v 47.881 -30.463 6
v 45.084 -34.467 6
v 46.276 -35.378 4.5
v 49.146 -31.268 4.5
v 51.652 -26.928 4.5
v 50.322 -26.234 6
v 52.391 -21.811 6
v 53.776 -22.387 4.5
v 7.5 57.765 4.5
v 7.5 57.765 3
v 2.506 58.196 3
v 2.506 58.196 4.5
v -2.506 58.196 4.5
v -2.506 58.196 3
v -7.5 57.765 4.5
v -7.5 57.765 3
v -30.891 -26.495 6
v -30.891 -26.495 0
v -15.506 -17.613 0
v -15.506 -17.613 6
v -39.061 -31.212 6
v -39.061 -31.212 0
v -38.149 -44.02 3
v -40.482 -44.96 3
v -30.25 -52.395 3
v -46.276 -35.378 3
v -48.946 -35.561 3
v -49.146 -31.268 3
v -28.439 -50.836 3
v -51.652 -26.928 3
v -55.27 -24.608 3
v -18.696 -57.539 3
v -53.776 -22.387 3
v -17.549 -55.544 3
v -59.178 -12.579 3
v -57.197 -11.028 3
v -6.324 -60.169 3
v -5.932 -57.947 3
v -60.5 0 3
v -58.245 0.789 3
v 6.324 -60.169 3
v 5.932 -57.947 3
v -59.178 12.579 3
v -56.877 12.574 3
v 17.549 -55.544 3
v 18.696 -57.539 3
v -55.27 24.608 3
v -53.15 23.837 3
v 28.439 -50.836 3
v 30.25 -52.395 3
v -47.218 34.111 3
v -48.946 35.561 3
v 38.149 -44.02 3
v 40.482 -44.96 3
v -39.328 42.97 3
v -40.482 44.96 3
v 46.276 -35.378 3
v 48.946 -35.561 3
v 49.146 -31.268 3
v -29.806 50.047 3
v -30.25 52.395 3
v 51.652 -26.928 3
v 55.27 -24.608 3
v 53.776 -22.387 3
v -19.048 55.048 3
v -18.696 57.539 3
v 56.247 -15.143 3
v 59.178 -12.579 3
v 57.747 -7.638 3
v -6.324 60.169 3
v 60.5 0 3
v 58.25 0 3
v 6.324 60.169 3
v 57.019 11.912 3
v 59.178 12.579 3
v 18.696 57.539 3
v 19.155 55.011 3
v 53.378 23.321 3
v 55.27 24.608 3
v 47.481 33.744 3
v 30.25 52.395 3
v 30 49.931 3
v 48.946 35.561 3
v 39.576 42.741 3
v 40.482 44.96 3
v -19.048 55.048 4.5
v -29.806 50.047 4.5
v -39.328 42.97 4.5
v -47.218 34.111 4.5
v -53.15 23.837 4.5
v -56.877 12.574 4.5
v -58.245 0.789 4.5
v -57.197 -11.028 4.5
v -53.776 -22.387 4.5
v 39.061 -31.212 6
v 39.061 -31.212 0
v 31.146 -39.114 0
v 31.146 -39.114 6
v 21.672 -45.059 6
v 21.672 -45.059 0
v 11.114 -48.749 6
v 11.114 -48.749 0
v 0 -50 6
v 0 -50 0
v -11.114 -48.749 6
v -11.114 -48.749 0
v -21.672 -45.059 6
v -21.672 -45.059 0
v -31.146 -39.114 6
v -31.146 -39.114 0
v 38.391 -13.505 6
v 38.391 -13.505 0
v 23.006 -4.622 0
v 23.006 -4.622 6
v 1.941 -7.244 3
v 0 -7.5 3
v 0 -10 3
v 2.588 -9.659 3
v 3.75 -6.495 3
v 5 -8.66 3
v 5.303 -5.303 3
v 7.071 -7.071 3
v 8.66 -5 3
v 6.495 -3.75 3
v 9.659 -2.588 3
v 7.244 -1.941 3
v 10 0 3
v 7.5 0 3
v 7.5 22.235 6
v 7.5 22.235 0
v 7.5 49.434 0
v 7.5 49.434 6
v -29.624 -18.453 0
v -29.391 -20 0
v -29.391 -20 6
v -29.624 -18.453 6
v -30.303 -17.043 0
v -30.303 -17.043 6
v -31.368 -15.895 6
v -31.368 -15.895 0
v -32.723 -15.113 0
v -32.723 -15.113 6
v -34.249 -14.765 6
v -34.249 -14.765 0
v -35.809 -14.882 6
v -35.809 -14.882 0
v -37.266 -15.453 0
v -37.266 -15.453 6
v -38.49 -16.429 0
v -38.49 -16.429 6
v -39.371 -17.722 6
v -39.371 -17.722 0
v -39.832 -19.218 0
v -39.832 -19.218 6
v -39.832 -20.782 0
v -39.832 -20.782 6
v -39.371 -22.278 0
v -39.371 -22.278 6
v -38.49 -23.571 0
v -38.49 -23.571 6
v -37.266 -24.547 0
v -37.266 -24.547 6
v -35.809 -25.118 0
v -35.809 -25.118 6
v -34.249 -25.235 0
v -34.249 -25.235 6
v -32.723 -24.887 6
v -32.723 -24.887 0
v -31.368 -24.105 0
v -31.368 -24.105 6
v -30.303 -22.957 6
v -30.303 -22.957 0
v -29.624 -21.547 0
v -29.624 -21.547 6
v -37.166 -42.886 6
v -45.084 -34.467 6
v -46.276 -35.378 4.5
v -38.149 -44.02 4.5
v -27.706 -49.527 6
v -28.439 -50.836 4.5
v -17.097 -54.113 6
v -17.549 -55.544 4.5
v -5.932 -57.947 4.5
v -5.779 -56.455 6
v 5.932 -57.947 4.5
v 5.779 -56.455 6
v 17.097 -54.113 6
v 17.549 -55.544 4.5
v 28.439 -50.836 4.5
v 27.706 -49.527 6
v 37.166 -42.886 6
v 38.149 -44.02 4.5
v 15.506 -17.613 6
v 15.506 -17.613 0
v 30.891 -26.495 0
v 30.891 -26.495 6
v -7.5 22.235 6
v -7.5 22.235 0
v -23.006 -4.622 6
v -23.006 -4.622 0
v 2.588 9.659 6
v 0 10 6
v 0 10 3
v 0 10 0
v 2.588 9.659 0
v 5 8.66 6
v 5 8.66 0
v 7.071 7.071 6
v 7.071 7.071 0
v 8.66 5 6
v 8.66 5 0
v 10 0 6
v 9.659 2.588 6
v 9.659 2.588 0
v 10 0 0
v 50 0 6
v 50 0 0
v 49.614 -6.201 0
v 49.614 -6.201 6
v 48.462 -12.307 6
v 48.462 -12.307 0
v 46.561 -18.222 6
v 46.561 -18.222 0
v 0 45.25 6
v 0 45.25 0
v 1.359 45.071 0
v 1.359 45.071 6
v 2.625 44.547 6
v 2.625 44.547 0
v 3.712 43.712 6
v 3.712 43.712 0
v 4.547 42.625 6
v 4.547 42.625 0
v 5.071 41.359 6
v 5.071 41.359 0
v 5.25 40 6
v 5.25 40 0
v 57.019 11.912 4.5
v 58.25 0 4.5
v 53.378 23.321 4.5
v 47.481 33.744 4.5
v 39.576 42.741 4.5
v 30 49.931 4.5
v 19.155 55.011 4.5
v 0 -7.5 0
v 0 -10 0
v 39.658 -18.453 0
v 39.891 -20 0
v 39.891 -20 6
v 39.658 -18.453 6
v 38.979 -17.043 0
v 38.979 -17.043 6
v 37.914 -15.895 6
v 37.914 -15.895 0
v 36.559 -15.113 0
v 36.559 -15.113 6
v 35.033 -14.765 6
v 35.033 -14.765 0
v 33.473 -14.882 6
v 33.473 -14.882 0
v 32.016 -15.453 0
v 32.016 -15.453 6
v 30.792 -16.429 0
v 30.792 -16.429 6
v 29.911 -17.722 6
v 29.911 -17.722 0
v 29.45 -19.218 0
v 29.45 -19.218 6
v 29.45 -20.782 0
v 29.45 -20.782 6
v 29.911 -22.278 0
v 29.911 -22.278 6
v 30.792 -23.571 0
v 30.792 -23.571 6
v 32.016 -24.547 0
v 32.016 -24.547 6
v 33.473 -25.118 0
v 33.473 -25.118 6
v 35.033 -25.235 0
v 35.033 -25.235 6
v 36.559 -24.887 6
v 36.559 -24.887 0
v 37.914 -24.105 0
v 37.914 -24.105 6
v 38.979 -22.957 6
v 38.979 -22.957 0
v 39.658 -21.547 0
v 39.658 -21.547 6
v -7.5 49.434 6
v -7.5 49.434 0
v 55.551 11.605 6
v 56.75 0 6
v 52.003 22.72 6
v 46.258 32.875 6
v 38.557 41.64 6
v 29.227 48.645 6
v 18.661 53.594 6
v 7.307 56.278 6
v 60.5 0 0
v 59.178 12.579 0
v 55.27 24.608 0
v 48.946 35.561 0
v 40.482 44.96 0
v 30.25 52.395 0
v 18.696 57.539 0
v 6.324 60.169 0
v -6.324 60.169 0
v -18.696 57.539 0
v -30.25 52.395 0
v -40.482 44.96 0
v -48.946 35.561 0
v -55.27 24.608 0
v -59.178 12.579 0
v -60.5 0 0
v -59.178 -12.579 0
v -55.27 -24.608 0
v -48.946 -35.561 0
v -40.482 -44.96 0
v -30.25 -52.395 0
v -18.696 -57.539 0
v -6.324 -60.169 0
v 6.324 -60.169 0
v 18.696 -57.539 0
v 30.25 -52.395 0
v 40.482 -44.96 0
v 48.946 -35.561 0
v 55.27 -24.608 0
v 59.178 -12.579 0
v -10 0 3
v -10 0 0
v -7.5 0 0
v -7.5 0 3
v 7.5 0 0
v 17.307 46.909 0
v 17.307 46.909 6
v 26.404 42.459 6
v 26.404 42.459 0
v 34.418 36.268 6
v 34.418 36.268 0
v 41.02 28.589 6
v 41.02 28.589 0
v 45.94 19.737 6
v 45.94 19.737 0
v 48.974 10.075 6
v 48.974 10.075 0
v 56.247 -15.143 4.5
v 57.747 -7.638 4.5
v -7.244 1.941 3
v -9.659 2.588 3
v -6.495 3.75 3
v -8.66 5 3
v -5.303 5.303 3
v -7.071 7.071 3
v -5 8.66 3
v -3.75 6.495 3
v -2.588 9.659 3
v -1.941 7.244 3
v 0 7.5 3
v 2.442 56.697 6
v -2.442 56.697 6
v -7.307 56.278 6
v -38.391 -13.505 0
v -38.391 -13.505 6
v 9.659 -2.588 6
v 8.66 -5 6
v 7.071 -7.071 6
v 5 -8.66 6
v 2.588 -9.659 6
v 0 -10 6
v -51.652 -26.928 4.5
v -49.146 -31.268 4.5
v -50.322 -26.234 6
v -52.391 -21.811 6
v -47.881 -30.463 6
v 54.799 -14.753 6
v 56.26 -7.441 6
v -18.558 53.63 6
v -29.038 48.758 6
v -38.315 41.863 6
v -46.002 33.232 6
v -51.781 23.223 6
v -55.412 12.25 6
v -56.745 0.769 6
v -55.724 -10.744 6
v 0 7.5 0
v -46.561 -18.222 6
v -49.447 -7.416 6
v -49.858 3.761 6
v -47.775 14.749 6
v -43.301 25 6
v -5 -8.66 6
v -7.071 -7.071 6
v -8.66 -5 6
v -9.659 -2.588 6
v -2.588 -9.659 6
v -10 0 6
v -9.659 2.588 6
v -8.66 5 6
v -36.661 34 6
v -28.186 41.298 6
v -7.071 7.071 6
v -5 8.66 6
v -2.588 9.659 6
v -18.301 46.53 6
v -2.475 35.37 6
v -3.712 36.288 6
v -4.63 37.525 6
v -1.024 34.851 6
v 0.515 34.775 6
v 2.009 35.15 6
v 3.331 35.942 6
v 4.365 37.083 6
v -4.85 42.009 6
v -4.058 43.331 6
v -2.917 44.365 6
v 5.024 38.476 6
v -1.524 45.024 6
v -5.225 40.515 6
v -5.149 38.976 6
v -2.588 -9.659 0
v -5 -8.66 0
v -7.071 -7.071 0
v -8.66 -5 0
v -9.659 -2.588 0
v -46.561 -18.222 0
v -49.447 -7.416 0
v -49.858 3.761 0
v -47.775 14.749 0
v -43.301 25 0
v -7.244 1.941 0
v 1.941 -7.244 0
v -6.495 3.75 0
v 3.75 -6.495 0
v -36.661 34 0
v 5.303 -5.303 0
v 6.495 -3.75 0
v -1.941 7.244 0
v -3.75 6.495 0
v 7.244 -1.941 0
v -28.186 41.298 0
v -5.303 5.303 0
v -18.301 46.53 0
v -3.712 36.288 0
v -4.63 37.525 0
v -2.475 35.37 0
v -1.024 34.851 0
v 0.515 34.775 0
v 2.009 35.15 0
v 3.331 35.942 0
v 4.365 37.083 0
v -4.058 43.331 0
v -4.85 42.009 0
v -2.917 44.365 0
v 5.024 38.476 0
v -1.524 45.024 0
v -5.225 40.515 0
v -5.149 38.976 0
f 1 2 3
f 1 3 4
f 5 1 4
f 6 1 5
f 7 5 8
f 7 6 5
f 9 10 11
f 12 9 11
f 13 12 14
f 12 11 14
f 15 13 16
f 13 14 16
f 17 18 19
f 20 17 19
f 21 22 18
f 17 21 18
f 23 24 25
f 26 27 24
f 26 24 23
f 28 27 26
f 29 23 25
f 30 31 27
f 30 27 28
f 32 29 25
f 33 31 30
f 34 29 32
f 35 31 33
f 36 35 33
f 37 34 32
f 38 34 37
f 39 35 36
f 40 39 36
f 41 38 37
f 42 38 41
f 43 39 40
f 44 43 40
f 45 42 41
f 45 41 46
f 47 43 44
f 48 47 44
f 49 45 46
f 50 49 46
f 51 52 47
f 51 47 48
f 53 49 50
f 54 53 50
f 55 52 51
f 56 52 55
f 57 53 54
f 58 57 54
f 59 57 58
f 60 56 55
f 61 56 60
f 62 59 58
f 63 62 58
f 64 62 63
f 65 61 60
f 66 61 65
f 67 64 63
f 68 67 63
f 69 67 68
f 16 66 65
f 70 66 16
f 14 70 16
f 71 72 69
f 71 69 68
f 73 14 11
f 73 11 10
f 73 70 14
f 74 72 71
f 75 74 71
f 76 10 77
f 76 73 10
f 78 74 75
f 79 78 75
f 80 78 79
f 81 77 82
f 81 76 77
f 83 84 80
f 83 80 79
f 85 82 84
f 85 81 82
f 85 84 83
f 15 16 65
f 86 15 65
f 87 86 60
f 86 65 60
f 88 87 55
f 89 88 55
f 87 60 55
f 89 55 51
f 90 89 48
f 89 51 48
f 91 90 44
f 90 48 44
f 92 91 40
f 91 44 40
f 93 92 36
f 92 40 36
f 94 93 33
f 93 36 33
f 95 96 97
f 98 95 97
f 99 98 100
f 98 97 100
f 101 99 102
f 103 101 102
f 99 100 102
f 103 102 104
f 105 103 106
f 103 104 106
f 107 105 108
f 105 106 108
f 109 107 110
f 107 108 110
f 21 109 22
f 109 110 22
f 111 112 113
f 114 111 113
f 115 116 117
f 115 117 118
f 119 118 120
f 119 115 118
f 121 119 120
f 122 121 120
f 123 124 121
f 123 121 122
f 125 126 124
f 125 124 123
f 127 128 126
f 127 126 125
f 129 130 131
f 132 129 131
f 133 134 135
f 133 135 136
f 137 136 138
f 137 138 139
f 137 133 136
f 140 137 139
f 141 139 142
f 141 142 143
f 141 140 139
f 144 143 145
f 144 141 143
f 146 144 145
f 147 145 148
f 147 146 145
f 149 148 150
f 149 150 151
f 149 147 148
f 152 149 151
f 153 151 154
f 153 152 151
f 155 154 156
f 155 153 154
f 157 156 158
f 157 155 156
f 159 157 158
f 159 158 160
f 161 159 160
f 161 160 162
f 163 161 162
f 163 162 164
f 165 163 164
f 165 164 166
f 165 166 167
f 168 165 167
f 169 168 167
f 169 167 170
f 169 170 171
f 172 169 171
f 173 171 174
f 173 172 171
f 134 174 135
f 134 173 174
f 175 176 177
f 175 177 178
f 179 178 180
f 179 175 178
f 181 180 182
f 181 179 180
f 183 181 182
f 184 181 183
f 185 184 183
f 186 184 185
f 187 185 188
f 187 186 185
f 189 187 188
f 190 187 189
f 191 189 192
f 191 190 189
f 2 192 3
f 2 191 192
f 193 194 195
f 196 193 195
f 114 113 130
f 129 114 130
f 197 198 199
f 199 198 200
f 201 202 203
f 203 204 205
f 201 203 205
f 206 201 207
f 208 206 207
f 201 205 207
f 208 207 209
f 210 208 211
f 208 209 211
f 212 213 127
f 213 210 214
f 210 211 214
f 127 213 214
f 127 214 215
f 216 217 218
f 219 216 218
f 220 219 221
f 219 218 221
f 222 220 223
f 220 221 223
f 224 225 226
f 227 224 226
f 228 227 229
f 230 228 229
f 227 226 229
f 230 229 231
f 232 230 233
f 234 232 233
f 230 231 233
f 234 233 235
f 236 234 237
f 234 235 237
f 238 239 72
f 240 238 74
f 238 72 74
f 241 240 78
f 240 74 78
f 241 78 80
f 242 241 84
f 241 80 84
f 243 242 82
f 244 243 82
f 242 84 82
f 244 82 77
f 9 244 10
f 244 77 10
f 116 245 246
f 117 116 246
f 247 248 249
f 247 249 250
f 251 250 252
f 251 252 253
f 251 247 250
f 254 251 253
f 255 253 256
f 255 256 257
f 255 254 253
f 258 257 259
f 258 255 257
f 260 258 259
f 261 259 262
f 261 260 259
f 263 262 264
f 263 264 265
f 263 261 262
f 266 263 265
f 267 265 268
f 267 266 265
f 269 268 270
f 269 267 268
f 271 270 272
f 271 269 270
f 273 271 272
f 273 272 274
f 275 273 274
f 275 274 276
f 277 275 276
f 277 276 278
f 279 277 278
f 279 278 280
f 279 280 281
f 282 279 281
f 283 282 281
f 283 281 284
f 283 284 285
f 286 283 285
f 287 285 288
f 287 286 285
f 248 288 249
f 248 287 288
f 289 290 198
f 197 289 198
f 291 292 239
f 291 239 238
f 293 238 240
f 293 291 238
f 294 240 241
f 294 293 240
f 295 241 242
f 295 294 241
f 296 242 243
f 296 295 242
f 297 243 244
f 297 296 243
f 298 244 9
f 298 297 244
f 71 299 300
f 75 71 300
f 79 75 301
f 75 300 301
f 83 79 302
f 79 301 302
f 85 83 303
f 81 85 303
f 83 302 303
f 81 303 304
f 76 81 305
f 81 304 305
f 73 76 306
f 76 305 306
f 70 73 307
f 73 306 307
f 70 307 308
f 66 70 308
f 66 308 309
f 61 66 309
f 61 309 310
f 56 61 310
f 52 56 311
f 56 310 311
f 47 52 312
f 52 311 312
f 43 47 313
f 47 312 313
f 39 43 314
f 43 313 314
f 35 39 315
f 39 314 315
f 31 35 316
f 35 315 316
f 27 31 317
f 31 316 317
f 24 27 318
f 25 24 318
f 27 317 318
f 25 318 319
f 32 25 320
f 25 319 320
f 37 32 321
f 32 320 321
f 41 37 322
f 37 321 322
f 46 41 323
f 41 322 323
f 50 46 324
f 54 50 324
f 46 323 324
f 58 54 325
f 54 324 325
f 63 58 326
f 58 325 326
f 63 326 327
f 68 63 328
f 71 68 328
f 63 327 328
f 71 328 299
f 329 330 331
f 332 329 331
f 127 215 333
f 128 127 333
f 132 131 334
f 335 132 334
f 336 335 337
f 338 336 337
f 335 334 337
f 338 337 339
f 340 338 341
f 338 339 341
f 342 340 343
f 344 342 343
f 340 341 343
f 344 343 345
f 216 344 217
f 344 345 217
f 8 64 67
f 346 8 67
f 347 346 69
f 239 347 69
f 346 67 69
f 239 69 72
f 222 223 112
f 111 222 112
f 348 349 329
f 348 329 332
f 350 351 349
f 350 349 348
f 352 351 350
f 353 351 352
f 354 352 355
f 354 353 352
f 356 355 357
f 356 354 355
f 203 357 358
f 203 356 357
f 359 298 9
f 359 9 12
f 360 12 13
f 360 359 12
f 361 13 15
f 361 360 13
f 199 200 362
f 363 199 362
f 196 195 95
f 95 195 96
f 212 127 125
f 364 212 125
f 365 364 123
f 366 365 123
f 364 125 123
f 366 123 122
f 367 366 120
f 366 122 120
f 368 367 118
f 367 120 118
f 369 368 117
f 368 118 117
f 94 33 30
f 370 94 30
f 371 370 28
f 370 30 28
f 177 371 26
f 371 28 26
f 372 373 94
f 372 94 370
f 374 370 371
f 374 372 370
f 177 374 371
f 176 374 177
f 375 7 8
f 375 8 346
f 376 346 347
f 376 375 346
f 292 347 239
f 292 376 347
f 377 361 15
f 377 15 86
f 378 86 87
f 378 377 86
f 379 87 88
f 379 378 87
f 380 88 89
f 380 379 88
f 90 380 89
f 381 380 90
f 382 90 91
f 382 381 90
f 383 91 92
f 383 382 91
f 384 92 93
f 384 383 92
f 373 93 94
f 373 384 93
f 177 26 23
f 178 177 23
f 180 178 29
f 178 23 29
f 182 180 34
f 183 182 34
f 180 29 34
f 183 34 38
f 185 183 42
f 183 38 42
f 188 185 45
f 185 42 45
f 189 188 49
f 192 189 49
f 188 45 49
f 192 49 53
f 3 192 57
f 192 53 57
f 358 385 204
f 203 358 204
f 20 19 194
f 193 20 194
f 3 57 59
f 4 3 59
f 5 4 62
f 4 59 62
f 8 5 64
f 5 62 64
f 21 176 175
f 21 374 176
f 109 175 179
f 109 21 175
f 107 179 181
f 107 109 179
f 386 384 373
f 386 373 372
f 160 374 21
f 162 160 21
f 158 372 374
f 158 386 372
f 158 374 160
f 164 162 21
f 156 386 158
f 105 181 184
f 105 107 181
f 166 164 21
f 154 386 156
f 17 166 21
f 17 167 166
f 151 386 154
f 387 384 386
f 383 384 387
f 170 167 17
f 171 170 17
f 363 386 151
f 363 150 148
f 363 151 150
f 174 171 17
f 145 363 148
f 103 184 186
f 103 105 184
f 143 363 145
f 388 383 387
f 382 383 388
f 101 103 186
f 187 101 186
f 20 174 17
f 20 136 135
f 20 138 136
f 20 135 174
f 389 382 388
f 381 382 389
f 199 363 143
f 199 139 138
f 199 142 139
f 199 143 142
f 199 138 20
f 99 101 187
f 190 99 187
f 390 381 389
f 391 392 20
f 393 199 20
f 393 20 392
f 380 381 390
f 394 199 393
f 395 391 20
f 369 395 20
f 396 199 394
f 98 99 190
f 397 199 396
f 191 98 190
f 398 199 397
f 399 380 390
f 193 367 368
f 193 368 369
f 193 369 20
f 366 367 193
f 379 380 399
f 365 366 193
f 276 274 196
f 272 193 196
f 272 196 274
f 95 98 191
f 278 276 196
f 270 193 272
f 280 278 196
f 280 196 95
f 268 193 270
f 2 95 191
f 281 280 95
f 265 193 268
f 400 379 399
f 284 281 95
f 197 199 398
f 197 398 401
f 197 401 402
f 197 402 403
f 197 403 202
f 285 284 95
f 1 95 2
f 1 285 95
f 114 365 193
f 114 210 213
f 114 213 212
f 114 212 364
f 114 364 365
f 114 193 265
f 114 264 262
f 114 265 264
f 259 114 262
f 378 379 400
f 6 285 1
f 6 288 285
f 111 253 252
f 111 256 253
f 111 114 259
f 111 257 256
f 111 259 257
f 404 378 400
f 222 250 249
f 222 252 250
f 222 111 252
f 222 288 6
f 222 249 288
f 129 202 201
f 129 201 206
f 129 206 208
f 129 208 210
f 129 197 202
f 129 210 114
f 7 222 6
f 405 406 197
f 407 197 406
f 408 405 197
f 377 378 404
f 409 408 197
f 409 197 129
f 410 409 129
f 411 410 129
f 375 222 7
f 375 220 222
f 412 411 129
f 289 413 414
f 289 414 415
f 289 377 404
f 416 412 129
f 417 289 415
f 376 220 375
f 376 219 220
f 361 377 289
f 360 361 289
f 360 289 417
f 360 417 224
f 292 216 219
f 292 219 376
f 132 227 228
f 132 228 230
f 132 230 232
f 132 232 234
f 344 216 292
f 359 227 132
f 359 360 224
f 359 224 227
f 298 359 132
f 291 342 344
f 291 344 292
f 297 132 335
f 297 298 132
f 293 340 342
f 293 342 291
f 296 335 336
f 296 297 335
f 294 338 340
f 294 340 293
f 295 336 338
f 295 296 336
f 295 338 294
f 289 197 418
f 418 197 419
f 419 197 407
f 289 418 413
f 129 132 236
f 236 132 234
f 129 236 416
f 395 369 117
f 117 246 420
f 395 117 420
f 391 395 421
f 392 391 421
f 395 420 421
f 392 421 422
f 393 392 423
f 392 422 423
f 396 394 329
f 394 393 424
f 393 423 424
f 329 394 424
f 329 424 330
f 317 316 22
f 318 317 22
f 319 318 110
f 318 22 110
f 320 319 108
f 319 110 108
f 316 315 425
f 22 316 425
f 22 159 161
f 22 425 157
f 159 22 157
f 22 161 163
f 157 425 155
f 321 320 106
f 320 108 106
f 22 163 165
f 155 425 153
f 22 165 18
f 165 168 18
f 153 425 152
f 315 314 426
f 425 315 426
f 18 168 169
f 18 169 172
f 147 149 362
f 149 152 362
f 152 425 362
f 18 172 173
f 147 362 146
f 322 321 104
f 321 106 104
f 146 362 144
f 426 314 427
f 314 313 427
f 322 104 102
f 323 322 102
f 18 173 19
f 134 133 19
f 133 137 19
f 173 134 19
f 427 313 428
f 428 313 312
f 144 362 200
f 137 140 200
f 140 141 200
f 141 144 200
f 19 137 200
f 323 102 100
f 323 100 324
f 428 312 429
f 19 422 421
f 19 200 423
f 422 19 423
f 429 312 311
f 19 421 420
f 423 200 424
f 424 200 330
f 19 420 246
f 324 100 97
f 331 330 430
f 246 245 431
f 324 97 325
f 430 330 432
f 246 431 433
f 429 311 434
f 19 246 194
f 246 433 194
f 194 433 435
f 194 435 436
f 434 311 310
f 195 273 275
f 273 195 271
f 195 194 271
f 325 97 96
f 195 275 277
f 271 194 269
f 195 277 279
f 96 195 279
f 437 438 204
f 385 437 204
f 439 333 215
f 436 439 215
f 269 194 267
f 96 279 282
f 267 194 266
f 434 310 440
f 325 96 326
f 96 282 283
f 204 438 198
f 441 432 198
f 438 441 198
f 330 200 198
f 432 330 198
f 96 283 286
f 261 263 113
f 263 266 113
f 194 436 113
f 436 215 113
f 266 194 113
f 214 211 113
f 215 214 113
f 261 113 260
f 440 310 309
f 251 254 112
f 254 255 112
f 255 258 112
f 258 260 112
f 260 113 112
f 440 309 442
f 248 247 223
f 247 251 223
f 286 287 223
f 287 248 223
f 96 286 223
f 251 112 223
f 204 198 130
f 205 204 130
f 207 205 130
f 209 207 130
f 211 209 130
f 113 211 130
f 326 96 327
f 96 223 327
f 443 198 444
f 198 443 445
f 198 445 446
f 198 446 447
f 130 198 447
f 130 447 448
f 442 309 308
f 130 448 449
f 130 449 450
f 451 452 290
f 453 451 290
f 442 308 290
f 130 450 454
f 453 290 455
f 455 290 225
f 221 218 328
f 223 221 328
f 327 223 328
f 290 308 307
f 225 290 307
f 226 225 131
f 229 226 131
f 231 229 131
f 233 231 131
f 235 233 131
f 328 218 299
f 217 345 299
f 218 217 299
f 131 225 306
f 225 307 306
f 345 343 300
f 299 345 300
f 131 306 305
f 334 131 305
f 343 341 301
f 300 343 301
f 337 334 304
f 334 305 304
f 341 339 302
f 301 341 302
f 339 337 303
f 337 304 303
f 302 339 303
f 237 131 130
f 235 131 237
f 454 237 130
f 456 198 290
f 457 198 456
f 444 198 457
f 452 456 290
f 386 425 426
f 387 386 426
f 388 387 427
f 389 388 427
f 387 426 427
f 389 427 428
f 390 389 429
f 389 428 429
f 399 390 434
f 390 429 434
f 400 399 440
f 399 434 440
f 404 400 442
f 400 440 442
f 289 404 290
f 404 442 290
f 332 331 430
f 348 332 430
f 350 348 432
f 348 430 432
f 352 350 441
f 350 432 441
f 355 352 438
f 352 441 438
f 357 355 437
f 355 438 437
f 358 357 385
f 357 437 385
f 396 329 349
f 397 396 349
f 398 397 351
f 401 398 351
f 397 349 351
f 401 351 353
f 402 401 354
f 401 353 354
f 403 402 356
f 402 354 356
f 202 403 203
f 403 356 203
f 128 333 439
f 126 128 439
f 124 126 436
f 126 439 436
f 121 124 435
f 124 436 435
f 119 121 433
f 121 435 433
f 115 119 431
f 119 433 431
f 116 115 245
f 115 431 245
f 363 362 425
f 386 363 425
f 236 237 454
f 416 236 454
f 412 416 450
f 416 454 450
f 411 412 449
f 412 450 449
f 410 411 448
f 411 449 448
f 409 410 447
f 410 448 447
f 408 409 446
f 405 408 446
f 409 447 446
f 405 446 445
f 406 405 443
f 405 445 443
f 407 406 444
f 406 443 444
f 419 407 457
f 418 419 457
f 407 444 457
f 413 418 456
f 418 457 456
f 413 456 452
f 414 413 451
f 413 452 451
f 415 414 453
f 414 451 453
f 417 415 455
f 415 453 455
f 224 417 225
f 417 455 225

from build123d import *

# Parameters (mm, degrees)
F0_R     = 5.25
F1_DEPTH = 6
F0_R_2   = 60.5
F2_DEPTH = 3
F3_SIZE  = 1.5


with BuildPart() as f1:
    # F0 (on Top) → F1 (new body)
    with BuildSketch(Plane.XY):
        with BuildLine():
            ThreePointArc((7.5, 49.4342998332), (37.9143772203, 32.596012026), (50, 0))
            ThreePointArc((50, 0), (49.1328198544, -9.2717858665), (46.5613594739, -18.2219593882))
            Line((46.5613594739, -18.2219593882), (53.7760869447, -22.3873842357))
            ThreePointArc((53.7760869447, -22.3873842357), (57.1205723209, -11.4150215828), (58.25, 0))
            ThreePointArc((58.25, 0), (43.7603559172, 38.4459848359), (7.5, 57.7651495281))
            Line((7.5, 57.7651495281), (7.5, 49.4342998332))
        make_face()
        with BuildLine():
            ThreePointArc((0, 50), (3.7606520937, 49.8583743801), (7.5, 49.4342998332))
            Line((7.5, 49.4342998332), (7.5, 57.7651495281))
            Line((7.5, 57.7651495281), (-7.5, 57.7651495281))
            Line((-7.5, 57.7651495281), (-7.5, 49.4342998332))
            ThreePointArc((-7.5, 49.4342998332), (-3.7606520937, 49.8583743801), (0, 50))
        make_face()
        with BuildLine():
            ThreePointArc((-46.5613594739, -18.2219593882), (-43.3012701892, 25), (-7.5, 49.4342998332))
            Line((-7.5, 49.4342998332), (-7.5, 57.7651495281))
            ThreePointArc((-7.5, 57.7651495281), (-50.4459797704, 29.125), (-53.7760869447, -22.3873842357))
            Line((-53.7760869447, -22.3873842357), (-46.5613594739, -18.2219593882))
        make_face()
        with BuildLine():
            Line((-46.2760869447, -35.3777652924), (-39.0613594739, -31.212340445))
            ThreePointArc((-39.0613594739, -31.212340445), (-43.3012701892, -25), (-46.5613594739, -18.2219593882))
            Line((-46.5613594739, -18.2219593882), (-53.7760869447, -22.3873842357))
            ThreePointArc((-53.7760869447, -22.3873842357), (-50.4459797704, -29.125), (-46.2760869447, -35.3777652924))
        make_face()
        with BuildLine():
            Line((46.2760869447, -35.3777652924), (39.0613594739, -31.212340445))
            ThreePointArc((39.0613594739, -31.212340445), (0, -50), (-39.0613594739, -31.212340445))
            Line((-39.0613594739, -31.212340445), (-46.2760869447, -35.3777652924))
            ThreePointArc((-46.2760869447, -35.3777652924), (0, -58.25), (46.2760869447, -35.3777652924))
        make_face()
        with BuildLine():
            Line((53.7760869447, -22.3873842357), (46.5613594739, -18.2219593882))
            ThreePointArc((46.5613594739, -18.2219593882), (43.3012701892, -25), (39.0613594739, -31.212340445))
            Line((39.0613594739, -31.212340445), (46.2760869447, -35.3777652924))
            ThreePointArc((46.2760869447, -35.3777652924), (50.4459797704, -29.125), (53.7760869447, -22.3873842357))
        make_face()
        with BuildLine():
            Line((-7.5, 57.7651495281), (7.5, 57.7651495281))
            ThreePointArc((7.5, 57.7651495281), (0, 58.25), (-7.5, 57.7651495281))
        make_face()
        with BuildLine():
            Line((7.5, 40), (7.5, 49.4342998332))
            ThreePointArc((7.5, 49.4342998332), (3.7606520937, 49.8583743801), (0, 50))
            Line((0, 50), (0, 47.5))
            ThreePointArc((0, 47.5), (5.3033008589, 45.3033008589), (7.5, 40))
        make_face()
        with BuildLine():
            Line((0, 47.5), (0, 50))
            ThreePointArc((0, 50), (-3.7606520937, 49.8583743801), (-7.5, 49.4342998332))
            Line((-7.5, 49.4342998332), (-7.5, 40))
            ThreePointArc((-7.5, 40), (-5.3033008589, 45.3033008589), (0, 47.5))
        make_face()
        with BuildLine():
            ThreePointArc((-7.5, 40), (0, 32.5), (7.5, 40))
            ThreePointArc((7.5, 40), (5.3033008589, 45.3033008589), (0, 47.5))
            ThreePointArc((0, 47.5), (-5.3033008589, 45.3033008589), (-7.5, 40))
        make_face()
        with BuildLine():
            ThreePointArc((5.25, 40), (-3.7123106012, 36.2876893988), (0, 45.25))
            ThreePointArc((0, 45.25), (3.7123106012, 43.7123106012), (5.25, 40))
        make_face(mode=Mode.SUBTRACT)
        with BuildLine():
            ThreePointArc((39.0613594739, -31.212340445), (43.3012701892, -25), (46.5613594739, -18.2219593882))
            Line((46.5613594739, -18.2219593882), (38.3910161948, -13.5048094967))
            ThreePointArc((38.3910161948, -13.5048094967), (41.1362066923, -16.2500000217), (42.1410161514, -20))
            ThreePointArc((42.1410161514, -20), (38.3910161049, -26.4951905552), (30.8910160584, -26.4951904747))
            Line((30.8910160584, -26.4951904747), (39.0613594739, -31.212340445))
        make_face()
        with BuildLine():
            ThreePointArc((42.1410161514, -20), (41.1362066923, -16.2500000217), (38.3910161948, -13.5048094967))
            ThreePointArc((38.3910161948, -13.5048094967), (28.1458256624, -16.2499999318), (30.8910160584, -26.4951904747))
            ThreePointArc((30.8910160584, -26.4951904747), (38.3910161049, -26.4951905552), (42.1410161514, -20))
        make_face()
        with Locations((34.6410161514, -20)):
            Circle(F0_R, mode=Mode.SUBTRACT)
        with BuildLine():
            ThreePointArc((-38.3910159202, -13.5048093381), (-41.1362067455, -23.7499998861), (-30.891016148, -26.4951905264))
            ThreePointArc((-30.891016148, -26.4951905264), (-28.145825622, -23.7499999983), (-27.1410161514, -20))
            ThreePointArc((-27.1410161514, -20), (-30.8910160358, -13.5048095384), (-38.3910159202, -13.5048093381))
        make_face()
        with Locations((-34.6410161514, -20)):
            Circle(F0_R, mode=Mode.SUBTRACT)
        with BuildLine():
            ThreePointArc((-46.5613594739, -18.2219593882), (-43.3012701892, -25), (-39.0613594739, -31.212340445))
            Line((-39.0613594739, -31.212340445), (-30.891016148, -26.4951905264))
            ThreePointArc((-30.891016148, -26.4951905264), (-41.1362067455, -23.7499998861), (-38.3910159202, -13.5048093381))
            Line((-38.3910159202, -13.5048093381), (-46.5613594739, -18.2219593882))
        make_face()
        with BuildLine():
            Line((7.5, 22.2348504719), (7.5, 40))
            ThreePointArc((7.5, 40), (0, 32.5), (-7.5, 40))
            Line((-7.5, 40), (-7.5, 22.2348504719))
            Line((-7.5, 22.2348504719), (7.5, 22.2348504719))
        make_face()
        with BuildLine():
            ThreePointArc((30.8910160584, -26.4951904747), (28.1458256624, -16.2499999318), (38.3910161948, -13.5048094967))
            Line((38.3910161948, -13.5048094967), (23.005945358, -4.6222347076))
            Line((23.005945358, -4.6222347076), (7.5, 22.2348504719))
            Line((7.5, 22.2348504719), (-7.5, 22.2348504719))
            Line((-7.5, 22.2348504719), (-23.005945358, -4.6222347076))
            Line((-23.005945358, -4.6222347076), (-38.3910159202, -13.5048093381))
            ThreePointArc((-38.3910159202, -13.5048093381), (-30.8910160358, -13.5048095384), (-27.1410161514, -20))
            ThreePointArc((-27.1410161514, -20), (-28.145825622, -23.7499999983), (-30.891016148, -26.4951905264))
            Line((-30.891016148, -26.4951905264), (-15.505945358, -17.6126157643))
            Line((-15.505945358, -17.6126157643), (15.505945358, -17.6126157643))
            Line((15.505945358, -17.6126157643), (30.8910160584, -26.4951904747))
        make_face()
        with BuildLine():
            ThreePointArc((0, 10), (7.0710678119, 7.0710678119), (10, 0))
            ThreePointArc((10, 0), (7.0710678119, -7.0710678119), (0, -10))
            ThreePointArc((0, -10), (-7.0710678119, -7.0710678119), (-10, 0))
            ThreePointArc((-10, 0), (-7.0710678119, 7.0710678119), (0, 10))
        make_face(mode=Mode.SUBTRACT)
    extrude(amount=F1_DEPTH)

    # F0 (on Top) → F2 (join)
    with BuildSketch(Plane.XY):
        Circle(F0_R_2)
        with BuildLine():
            ThreePointArc((-7.5, 57.7651495281), (0, 58.25), (7.5, 57.7651495281))
            ThreePointArc((7.5, 57.7651495281), (43.7603559172, 38.4459848359), (58.25, 0))
            ThreePointArc((58.25, 0), (57.1205723209, -11.4150215828), (53.7760869447, -22.3873842357))
            ThreePointArc((53.7760869447, -22.3873842357), (50.4459797704, -29.125), (46.2760869447, -35.3777652924))
            ThreePointArc((46.2760869447, -35.3777652924), (0, -58.25), (-46.2760869447, -35.3777652924))
            ThreePointArc((-46.2760869447, -35.3777652924), (-50.4459797704, -29.125), (-53.7760869447, -22.3873842357))
            ThreePointArc((-53.7760869447, -22.3873842357), (-50.4459797704, 29.125), (-7.5, 57.7651495281))
        make_face(mode=Mode.SUBTRACT)
        with BuildLine():
            ThreePointArc((-7.5, 0), (-5.3033008589, 5.3033008589), (0, 7.5))
            Line((0, 7.5), (0, 10))
            ThreePointArc((0, 10), (-7.0710678119, 7.0710678119), (-10, 0))
            Line((-10, 0), (-7.5, 0))
        make_face()
        with BuildLine():
            Line((10, 0), (7.5, 0))
            ThreePointArc((7.5, 0), (5.3033008589, -5.3033008589), (0, -7.5))
            Line((0, -7.5), (0, -10))
            ThreePointArc((0, -10), (7.0710678119, -7.0710678119), (10, 0))
        make_face()
    extrude(amount=F2_DEPTH)

    # F3
    f3_edges = [f1.edges().sort_by_distance(p)[0] for p in [
        (-7.5, -57.76515, 6),
    ]]
    chamfer(f3_edges, length=F3_SIZE)


solid = f1.part
